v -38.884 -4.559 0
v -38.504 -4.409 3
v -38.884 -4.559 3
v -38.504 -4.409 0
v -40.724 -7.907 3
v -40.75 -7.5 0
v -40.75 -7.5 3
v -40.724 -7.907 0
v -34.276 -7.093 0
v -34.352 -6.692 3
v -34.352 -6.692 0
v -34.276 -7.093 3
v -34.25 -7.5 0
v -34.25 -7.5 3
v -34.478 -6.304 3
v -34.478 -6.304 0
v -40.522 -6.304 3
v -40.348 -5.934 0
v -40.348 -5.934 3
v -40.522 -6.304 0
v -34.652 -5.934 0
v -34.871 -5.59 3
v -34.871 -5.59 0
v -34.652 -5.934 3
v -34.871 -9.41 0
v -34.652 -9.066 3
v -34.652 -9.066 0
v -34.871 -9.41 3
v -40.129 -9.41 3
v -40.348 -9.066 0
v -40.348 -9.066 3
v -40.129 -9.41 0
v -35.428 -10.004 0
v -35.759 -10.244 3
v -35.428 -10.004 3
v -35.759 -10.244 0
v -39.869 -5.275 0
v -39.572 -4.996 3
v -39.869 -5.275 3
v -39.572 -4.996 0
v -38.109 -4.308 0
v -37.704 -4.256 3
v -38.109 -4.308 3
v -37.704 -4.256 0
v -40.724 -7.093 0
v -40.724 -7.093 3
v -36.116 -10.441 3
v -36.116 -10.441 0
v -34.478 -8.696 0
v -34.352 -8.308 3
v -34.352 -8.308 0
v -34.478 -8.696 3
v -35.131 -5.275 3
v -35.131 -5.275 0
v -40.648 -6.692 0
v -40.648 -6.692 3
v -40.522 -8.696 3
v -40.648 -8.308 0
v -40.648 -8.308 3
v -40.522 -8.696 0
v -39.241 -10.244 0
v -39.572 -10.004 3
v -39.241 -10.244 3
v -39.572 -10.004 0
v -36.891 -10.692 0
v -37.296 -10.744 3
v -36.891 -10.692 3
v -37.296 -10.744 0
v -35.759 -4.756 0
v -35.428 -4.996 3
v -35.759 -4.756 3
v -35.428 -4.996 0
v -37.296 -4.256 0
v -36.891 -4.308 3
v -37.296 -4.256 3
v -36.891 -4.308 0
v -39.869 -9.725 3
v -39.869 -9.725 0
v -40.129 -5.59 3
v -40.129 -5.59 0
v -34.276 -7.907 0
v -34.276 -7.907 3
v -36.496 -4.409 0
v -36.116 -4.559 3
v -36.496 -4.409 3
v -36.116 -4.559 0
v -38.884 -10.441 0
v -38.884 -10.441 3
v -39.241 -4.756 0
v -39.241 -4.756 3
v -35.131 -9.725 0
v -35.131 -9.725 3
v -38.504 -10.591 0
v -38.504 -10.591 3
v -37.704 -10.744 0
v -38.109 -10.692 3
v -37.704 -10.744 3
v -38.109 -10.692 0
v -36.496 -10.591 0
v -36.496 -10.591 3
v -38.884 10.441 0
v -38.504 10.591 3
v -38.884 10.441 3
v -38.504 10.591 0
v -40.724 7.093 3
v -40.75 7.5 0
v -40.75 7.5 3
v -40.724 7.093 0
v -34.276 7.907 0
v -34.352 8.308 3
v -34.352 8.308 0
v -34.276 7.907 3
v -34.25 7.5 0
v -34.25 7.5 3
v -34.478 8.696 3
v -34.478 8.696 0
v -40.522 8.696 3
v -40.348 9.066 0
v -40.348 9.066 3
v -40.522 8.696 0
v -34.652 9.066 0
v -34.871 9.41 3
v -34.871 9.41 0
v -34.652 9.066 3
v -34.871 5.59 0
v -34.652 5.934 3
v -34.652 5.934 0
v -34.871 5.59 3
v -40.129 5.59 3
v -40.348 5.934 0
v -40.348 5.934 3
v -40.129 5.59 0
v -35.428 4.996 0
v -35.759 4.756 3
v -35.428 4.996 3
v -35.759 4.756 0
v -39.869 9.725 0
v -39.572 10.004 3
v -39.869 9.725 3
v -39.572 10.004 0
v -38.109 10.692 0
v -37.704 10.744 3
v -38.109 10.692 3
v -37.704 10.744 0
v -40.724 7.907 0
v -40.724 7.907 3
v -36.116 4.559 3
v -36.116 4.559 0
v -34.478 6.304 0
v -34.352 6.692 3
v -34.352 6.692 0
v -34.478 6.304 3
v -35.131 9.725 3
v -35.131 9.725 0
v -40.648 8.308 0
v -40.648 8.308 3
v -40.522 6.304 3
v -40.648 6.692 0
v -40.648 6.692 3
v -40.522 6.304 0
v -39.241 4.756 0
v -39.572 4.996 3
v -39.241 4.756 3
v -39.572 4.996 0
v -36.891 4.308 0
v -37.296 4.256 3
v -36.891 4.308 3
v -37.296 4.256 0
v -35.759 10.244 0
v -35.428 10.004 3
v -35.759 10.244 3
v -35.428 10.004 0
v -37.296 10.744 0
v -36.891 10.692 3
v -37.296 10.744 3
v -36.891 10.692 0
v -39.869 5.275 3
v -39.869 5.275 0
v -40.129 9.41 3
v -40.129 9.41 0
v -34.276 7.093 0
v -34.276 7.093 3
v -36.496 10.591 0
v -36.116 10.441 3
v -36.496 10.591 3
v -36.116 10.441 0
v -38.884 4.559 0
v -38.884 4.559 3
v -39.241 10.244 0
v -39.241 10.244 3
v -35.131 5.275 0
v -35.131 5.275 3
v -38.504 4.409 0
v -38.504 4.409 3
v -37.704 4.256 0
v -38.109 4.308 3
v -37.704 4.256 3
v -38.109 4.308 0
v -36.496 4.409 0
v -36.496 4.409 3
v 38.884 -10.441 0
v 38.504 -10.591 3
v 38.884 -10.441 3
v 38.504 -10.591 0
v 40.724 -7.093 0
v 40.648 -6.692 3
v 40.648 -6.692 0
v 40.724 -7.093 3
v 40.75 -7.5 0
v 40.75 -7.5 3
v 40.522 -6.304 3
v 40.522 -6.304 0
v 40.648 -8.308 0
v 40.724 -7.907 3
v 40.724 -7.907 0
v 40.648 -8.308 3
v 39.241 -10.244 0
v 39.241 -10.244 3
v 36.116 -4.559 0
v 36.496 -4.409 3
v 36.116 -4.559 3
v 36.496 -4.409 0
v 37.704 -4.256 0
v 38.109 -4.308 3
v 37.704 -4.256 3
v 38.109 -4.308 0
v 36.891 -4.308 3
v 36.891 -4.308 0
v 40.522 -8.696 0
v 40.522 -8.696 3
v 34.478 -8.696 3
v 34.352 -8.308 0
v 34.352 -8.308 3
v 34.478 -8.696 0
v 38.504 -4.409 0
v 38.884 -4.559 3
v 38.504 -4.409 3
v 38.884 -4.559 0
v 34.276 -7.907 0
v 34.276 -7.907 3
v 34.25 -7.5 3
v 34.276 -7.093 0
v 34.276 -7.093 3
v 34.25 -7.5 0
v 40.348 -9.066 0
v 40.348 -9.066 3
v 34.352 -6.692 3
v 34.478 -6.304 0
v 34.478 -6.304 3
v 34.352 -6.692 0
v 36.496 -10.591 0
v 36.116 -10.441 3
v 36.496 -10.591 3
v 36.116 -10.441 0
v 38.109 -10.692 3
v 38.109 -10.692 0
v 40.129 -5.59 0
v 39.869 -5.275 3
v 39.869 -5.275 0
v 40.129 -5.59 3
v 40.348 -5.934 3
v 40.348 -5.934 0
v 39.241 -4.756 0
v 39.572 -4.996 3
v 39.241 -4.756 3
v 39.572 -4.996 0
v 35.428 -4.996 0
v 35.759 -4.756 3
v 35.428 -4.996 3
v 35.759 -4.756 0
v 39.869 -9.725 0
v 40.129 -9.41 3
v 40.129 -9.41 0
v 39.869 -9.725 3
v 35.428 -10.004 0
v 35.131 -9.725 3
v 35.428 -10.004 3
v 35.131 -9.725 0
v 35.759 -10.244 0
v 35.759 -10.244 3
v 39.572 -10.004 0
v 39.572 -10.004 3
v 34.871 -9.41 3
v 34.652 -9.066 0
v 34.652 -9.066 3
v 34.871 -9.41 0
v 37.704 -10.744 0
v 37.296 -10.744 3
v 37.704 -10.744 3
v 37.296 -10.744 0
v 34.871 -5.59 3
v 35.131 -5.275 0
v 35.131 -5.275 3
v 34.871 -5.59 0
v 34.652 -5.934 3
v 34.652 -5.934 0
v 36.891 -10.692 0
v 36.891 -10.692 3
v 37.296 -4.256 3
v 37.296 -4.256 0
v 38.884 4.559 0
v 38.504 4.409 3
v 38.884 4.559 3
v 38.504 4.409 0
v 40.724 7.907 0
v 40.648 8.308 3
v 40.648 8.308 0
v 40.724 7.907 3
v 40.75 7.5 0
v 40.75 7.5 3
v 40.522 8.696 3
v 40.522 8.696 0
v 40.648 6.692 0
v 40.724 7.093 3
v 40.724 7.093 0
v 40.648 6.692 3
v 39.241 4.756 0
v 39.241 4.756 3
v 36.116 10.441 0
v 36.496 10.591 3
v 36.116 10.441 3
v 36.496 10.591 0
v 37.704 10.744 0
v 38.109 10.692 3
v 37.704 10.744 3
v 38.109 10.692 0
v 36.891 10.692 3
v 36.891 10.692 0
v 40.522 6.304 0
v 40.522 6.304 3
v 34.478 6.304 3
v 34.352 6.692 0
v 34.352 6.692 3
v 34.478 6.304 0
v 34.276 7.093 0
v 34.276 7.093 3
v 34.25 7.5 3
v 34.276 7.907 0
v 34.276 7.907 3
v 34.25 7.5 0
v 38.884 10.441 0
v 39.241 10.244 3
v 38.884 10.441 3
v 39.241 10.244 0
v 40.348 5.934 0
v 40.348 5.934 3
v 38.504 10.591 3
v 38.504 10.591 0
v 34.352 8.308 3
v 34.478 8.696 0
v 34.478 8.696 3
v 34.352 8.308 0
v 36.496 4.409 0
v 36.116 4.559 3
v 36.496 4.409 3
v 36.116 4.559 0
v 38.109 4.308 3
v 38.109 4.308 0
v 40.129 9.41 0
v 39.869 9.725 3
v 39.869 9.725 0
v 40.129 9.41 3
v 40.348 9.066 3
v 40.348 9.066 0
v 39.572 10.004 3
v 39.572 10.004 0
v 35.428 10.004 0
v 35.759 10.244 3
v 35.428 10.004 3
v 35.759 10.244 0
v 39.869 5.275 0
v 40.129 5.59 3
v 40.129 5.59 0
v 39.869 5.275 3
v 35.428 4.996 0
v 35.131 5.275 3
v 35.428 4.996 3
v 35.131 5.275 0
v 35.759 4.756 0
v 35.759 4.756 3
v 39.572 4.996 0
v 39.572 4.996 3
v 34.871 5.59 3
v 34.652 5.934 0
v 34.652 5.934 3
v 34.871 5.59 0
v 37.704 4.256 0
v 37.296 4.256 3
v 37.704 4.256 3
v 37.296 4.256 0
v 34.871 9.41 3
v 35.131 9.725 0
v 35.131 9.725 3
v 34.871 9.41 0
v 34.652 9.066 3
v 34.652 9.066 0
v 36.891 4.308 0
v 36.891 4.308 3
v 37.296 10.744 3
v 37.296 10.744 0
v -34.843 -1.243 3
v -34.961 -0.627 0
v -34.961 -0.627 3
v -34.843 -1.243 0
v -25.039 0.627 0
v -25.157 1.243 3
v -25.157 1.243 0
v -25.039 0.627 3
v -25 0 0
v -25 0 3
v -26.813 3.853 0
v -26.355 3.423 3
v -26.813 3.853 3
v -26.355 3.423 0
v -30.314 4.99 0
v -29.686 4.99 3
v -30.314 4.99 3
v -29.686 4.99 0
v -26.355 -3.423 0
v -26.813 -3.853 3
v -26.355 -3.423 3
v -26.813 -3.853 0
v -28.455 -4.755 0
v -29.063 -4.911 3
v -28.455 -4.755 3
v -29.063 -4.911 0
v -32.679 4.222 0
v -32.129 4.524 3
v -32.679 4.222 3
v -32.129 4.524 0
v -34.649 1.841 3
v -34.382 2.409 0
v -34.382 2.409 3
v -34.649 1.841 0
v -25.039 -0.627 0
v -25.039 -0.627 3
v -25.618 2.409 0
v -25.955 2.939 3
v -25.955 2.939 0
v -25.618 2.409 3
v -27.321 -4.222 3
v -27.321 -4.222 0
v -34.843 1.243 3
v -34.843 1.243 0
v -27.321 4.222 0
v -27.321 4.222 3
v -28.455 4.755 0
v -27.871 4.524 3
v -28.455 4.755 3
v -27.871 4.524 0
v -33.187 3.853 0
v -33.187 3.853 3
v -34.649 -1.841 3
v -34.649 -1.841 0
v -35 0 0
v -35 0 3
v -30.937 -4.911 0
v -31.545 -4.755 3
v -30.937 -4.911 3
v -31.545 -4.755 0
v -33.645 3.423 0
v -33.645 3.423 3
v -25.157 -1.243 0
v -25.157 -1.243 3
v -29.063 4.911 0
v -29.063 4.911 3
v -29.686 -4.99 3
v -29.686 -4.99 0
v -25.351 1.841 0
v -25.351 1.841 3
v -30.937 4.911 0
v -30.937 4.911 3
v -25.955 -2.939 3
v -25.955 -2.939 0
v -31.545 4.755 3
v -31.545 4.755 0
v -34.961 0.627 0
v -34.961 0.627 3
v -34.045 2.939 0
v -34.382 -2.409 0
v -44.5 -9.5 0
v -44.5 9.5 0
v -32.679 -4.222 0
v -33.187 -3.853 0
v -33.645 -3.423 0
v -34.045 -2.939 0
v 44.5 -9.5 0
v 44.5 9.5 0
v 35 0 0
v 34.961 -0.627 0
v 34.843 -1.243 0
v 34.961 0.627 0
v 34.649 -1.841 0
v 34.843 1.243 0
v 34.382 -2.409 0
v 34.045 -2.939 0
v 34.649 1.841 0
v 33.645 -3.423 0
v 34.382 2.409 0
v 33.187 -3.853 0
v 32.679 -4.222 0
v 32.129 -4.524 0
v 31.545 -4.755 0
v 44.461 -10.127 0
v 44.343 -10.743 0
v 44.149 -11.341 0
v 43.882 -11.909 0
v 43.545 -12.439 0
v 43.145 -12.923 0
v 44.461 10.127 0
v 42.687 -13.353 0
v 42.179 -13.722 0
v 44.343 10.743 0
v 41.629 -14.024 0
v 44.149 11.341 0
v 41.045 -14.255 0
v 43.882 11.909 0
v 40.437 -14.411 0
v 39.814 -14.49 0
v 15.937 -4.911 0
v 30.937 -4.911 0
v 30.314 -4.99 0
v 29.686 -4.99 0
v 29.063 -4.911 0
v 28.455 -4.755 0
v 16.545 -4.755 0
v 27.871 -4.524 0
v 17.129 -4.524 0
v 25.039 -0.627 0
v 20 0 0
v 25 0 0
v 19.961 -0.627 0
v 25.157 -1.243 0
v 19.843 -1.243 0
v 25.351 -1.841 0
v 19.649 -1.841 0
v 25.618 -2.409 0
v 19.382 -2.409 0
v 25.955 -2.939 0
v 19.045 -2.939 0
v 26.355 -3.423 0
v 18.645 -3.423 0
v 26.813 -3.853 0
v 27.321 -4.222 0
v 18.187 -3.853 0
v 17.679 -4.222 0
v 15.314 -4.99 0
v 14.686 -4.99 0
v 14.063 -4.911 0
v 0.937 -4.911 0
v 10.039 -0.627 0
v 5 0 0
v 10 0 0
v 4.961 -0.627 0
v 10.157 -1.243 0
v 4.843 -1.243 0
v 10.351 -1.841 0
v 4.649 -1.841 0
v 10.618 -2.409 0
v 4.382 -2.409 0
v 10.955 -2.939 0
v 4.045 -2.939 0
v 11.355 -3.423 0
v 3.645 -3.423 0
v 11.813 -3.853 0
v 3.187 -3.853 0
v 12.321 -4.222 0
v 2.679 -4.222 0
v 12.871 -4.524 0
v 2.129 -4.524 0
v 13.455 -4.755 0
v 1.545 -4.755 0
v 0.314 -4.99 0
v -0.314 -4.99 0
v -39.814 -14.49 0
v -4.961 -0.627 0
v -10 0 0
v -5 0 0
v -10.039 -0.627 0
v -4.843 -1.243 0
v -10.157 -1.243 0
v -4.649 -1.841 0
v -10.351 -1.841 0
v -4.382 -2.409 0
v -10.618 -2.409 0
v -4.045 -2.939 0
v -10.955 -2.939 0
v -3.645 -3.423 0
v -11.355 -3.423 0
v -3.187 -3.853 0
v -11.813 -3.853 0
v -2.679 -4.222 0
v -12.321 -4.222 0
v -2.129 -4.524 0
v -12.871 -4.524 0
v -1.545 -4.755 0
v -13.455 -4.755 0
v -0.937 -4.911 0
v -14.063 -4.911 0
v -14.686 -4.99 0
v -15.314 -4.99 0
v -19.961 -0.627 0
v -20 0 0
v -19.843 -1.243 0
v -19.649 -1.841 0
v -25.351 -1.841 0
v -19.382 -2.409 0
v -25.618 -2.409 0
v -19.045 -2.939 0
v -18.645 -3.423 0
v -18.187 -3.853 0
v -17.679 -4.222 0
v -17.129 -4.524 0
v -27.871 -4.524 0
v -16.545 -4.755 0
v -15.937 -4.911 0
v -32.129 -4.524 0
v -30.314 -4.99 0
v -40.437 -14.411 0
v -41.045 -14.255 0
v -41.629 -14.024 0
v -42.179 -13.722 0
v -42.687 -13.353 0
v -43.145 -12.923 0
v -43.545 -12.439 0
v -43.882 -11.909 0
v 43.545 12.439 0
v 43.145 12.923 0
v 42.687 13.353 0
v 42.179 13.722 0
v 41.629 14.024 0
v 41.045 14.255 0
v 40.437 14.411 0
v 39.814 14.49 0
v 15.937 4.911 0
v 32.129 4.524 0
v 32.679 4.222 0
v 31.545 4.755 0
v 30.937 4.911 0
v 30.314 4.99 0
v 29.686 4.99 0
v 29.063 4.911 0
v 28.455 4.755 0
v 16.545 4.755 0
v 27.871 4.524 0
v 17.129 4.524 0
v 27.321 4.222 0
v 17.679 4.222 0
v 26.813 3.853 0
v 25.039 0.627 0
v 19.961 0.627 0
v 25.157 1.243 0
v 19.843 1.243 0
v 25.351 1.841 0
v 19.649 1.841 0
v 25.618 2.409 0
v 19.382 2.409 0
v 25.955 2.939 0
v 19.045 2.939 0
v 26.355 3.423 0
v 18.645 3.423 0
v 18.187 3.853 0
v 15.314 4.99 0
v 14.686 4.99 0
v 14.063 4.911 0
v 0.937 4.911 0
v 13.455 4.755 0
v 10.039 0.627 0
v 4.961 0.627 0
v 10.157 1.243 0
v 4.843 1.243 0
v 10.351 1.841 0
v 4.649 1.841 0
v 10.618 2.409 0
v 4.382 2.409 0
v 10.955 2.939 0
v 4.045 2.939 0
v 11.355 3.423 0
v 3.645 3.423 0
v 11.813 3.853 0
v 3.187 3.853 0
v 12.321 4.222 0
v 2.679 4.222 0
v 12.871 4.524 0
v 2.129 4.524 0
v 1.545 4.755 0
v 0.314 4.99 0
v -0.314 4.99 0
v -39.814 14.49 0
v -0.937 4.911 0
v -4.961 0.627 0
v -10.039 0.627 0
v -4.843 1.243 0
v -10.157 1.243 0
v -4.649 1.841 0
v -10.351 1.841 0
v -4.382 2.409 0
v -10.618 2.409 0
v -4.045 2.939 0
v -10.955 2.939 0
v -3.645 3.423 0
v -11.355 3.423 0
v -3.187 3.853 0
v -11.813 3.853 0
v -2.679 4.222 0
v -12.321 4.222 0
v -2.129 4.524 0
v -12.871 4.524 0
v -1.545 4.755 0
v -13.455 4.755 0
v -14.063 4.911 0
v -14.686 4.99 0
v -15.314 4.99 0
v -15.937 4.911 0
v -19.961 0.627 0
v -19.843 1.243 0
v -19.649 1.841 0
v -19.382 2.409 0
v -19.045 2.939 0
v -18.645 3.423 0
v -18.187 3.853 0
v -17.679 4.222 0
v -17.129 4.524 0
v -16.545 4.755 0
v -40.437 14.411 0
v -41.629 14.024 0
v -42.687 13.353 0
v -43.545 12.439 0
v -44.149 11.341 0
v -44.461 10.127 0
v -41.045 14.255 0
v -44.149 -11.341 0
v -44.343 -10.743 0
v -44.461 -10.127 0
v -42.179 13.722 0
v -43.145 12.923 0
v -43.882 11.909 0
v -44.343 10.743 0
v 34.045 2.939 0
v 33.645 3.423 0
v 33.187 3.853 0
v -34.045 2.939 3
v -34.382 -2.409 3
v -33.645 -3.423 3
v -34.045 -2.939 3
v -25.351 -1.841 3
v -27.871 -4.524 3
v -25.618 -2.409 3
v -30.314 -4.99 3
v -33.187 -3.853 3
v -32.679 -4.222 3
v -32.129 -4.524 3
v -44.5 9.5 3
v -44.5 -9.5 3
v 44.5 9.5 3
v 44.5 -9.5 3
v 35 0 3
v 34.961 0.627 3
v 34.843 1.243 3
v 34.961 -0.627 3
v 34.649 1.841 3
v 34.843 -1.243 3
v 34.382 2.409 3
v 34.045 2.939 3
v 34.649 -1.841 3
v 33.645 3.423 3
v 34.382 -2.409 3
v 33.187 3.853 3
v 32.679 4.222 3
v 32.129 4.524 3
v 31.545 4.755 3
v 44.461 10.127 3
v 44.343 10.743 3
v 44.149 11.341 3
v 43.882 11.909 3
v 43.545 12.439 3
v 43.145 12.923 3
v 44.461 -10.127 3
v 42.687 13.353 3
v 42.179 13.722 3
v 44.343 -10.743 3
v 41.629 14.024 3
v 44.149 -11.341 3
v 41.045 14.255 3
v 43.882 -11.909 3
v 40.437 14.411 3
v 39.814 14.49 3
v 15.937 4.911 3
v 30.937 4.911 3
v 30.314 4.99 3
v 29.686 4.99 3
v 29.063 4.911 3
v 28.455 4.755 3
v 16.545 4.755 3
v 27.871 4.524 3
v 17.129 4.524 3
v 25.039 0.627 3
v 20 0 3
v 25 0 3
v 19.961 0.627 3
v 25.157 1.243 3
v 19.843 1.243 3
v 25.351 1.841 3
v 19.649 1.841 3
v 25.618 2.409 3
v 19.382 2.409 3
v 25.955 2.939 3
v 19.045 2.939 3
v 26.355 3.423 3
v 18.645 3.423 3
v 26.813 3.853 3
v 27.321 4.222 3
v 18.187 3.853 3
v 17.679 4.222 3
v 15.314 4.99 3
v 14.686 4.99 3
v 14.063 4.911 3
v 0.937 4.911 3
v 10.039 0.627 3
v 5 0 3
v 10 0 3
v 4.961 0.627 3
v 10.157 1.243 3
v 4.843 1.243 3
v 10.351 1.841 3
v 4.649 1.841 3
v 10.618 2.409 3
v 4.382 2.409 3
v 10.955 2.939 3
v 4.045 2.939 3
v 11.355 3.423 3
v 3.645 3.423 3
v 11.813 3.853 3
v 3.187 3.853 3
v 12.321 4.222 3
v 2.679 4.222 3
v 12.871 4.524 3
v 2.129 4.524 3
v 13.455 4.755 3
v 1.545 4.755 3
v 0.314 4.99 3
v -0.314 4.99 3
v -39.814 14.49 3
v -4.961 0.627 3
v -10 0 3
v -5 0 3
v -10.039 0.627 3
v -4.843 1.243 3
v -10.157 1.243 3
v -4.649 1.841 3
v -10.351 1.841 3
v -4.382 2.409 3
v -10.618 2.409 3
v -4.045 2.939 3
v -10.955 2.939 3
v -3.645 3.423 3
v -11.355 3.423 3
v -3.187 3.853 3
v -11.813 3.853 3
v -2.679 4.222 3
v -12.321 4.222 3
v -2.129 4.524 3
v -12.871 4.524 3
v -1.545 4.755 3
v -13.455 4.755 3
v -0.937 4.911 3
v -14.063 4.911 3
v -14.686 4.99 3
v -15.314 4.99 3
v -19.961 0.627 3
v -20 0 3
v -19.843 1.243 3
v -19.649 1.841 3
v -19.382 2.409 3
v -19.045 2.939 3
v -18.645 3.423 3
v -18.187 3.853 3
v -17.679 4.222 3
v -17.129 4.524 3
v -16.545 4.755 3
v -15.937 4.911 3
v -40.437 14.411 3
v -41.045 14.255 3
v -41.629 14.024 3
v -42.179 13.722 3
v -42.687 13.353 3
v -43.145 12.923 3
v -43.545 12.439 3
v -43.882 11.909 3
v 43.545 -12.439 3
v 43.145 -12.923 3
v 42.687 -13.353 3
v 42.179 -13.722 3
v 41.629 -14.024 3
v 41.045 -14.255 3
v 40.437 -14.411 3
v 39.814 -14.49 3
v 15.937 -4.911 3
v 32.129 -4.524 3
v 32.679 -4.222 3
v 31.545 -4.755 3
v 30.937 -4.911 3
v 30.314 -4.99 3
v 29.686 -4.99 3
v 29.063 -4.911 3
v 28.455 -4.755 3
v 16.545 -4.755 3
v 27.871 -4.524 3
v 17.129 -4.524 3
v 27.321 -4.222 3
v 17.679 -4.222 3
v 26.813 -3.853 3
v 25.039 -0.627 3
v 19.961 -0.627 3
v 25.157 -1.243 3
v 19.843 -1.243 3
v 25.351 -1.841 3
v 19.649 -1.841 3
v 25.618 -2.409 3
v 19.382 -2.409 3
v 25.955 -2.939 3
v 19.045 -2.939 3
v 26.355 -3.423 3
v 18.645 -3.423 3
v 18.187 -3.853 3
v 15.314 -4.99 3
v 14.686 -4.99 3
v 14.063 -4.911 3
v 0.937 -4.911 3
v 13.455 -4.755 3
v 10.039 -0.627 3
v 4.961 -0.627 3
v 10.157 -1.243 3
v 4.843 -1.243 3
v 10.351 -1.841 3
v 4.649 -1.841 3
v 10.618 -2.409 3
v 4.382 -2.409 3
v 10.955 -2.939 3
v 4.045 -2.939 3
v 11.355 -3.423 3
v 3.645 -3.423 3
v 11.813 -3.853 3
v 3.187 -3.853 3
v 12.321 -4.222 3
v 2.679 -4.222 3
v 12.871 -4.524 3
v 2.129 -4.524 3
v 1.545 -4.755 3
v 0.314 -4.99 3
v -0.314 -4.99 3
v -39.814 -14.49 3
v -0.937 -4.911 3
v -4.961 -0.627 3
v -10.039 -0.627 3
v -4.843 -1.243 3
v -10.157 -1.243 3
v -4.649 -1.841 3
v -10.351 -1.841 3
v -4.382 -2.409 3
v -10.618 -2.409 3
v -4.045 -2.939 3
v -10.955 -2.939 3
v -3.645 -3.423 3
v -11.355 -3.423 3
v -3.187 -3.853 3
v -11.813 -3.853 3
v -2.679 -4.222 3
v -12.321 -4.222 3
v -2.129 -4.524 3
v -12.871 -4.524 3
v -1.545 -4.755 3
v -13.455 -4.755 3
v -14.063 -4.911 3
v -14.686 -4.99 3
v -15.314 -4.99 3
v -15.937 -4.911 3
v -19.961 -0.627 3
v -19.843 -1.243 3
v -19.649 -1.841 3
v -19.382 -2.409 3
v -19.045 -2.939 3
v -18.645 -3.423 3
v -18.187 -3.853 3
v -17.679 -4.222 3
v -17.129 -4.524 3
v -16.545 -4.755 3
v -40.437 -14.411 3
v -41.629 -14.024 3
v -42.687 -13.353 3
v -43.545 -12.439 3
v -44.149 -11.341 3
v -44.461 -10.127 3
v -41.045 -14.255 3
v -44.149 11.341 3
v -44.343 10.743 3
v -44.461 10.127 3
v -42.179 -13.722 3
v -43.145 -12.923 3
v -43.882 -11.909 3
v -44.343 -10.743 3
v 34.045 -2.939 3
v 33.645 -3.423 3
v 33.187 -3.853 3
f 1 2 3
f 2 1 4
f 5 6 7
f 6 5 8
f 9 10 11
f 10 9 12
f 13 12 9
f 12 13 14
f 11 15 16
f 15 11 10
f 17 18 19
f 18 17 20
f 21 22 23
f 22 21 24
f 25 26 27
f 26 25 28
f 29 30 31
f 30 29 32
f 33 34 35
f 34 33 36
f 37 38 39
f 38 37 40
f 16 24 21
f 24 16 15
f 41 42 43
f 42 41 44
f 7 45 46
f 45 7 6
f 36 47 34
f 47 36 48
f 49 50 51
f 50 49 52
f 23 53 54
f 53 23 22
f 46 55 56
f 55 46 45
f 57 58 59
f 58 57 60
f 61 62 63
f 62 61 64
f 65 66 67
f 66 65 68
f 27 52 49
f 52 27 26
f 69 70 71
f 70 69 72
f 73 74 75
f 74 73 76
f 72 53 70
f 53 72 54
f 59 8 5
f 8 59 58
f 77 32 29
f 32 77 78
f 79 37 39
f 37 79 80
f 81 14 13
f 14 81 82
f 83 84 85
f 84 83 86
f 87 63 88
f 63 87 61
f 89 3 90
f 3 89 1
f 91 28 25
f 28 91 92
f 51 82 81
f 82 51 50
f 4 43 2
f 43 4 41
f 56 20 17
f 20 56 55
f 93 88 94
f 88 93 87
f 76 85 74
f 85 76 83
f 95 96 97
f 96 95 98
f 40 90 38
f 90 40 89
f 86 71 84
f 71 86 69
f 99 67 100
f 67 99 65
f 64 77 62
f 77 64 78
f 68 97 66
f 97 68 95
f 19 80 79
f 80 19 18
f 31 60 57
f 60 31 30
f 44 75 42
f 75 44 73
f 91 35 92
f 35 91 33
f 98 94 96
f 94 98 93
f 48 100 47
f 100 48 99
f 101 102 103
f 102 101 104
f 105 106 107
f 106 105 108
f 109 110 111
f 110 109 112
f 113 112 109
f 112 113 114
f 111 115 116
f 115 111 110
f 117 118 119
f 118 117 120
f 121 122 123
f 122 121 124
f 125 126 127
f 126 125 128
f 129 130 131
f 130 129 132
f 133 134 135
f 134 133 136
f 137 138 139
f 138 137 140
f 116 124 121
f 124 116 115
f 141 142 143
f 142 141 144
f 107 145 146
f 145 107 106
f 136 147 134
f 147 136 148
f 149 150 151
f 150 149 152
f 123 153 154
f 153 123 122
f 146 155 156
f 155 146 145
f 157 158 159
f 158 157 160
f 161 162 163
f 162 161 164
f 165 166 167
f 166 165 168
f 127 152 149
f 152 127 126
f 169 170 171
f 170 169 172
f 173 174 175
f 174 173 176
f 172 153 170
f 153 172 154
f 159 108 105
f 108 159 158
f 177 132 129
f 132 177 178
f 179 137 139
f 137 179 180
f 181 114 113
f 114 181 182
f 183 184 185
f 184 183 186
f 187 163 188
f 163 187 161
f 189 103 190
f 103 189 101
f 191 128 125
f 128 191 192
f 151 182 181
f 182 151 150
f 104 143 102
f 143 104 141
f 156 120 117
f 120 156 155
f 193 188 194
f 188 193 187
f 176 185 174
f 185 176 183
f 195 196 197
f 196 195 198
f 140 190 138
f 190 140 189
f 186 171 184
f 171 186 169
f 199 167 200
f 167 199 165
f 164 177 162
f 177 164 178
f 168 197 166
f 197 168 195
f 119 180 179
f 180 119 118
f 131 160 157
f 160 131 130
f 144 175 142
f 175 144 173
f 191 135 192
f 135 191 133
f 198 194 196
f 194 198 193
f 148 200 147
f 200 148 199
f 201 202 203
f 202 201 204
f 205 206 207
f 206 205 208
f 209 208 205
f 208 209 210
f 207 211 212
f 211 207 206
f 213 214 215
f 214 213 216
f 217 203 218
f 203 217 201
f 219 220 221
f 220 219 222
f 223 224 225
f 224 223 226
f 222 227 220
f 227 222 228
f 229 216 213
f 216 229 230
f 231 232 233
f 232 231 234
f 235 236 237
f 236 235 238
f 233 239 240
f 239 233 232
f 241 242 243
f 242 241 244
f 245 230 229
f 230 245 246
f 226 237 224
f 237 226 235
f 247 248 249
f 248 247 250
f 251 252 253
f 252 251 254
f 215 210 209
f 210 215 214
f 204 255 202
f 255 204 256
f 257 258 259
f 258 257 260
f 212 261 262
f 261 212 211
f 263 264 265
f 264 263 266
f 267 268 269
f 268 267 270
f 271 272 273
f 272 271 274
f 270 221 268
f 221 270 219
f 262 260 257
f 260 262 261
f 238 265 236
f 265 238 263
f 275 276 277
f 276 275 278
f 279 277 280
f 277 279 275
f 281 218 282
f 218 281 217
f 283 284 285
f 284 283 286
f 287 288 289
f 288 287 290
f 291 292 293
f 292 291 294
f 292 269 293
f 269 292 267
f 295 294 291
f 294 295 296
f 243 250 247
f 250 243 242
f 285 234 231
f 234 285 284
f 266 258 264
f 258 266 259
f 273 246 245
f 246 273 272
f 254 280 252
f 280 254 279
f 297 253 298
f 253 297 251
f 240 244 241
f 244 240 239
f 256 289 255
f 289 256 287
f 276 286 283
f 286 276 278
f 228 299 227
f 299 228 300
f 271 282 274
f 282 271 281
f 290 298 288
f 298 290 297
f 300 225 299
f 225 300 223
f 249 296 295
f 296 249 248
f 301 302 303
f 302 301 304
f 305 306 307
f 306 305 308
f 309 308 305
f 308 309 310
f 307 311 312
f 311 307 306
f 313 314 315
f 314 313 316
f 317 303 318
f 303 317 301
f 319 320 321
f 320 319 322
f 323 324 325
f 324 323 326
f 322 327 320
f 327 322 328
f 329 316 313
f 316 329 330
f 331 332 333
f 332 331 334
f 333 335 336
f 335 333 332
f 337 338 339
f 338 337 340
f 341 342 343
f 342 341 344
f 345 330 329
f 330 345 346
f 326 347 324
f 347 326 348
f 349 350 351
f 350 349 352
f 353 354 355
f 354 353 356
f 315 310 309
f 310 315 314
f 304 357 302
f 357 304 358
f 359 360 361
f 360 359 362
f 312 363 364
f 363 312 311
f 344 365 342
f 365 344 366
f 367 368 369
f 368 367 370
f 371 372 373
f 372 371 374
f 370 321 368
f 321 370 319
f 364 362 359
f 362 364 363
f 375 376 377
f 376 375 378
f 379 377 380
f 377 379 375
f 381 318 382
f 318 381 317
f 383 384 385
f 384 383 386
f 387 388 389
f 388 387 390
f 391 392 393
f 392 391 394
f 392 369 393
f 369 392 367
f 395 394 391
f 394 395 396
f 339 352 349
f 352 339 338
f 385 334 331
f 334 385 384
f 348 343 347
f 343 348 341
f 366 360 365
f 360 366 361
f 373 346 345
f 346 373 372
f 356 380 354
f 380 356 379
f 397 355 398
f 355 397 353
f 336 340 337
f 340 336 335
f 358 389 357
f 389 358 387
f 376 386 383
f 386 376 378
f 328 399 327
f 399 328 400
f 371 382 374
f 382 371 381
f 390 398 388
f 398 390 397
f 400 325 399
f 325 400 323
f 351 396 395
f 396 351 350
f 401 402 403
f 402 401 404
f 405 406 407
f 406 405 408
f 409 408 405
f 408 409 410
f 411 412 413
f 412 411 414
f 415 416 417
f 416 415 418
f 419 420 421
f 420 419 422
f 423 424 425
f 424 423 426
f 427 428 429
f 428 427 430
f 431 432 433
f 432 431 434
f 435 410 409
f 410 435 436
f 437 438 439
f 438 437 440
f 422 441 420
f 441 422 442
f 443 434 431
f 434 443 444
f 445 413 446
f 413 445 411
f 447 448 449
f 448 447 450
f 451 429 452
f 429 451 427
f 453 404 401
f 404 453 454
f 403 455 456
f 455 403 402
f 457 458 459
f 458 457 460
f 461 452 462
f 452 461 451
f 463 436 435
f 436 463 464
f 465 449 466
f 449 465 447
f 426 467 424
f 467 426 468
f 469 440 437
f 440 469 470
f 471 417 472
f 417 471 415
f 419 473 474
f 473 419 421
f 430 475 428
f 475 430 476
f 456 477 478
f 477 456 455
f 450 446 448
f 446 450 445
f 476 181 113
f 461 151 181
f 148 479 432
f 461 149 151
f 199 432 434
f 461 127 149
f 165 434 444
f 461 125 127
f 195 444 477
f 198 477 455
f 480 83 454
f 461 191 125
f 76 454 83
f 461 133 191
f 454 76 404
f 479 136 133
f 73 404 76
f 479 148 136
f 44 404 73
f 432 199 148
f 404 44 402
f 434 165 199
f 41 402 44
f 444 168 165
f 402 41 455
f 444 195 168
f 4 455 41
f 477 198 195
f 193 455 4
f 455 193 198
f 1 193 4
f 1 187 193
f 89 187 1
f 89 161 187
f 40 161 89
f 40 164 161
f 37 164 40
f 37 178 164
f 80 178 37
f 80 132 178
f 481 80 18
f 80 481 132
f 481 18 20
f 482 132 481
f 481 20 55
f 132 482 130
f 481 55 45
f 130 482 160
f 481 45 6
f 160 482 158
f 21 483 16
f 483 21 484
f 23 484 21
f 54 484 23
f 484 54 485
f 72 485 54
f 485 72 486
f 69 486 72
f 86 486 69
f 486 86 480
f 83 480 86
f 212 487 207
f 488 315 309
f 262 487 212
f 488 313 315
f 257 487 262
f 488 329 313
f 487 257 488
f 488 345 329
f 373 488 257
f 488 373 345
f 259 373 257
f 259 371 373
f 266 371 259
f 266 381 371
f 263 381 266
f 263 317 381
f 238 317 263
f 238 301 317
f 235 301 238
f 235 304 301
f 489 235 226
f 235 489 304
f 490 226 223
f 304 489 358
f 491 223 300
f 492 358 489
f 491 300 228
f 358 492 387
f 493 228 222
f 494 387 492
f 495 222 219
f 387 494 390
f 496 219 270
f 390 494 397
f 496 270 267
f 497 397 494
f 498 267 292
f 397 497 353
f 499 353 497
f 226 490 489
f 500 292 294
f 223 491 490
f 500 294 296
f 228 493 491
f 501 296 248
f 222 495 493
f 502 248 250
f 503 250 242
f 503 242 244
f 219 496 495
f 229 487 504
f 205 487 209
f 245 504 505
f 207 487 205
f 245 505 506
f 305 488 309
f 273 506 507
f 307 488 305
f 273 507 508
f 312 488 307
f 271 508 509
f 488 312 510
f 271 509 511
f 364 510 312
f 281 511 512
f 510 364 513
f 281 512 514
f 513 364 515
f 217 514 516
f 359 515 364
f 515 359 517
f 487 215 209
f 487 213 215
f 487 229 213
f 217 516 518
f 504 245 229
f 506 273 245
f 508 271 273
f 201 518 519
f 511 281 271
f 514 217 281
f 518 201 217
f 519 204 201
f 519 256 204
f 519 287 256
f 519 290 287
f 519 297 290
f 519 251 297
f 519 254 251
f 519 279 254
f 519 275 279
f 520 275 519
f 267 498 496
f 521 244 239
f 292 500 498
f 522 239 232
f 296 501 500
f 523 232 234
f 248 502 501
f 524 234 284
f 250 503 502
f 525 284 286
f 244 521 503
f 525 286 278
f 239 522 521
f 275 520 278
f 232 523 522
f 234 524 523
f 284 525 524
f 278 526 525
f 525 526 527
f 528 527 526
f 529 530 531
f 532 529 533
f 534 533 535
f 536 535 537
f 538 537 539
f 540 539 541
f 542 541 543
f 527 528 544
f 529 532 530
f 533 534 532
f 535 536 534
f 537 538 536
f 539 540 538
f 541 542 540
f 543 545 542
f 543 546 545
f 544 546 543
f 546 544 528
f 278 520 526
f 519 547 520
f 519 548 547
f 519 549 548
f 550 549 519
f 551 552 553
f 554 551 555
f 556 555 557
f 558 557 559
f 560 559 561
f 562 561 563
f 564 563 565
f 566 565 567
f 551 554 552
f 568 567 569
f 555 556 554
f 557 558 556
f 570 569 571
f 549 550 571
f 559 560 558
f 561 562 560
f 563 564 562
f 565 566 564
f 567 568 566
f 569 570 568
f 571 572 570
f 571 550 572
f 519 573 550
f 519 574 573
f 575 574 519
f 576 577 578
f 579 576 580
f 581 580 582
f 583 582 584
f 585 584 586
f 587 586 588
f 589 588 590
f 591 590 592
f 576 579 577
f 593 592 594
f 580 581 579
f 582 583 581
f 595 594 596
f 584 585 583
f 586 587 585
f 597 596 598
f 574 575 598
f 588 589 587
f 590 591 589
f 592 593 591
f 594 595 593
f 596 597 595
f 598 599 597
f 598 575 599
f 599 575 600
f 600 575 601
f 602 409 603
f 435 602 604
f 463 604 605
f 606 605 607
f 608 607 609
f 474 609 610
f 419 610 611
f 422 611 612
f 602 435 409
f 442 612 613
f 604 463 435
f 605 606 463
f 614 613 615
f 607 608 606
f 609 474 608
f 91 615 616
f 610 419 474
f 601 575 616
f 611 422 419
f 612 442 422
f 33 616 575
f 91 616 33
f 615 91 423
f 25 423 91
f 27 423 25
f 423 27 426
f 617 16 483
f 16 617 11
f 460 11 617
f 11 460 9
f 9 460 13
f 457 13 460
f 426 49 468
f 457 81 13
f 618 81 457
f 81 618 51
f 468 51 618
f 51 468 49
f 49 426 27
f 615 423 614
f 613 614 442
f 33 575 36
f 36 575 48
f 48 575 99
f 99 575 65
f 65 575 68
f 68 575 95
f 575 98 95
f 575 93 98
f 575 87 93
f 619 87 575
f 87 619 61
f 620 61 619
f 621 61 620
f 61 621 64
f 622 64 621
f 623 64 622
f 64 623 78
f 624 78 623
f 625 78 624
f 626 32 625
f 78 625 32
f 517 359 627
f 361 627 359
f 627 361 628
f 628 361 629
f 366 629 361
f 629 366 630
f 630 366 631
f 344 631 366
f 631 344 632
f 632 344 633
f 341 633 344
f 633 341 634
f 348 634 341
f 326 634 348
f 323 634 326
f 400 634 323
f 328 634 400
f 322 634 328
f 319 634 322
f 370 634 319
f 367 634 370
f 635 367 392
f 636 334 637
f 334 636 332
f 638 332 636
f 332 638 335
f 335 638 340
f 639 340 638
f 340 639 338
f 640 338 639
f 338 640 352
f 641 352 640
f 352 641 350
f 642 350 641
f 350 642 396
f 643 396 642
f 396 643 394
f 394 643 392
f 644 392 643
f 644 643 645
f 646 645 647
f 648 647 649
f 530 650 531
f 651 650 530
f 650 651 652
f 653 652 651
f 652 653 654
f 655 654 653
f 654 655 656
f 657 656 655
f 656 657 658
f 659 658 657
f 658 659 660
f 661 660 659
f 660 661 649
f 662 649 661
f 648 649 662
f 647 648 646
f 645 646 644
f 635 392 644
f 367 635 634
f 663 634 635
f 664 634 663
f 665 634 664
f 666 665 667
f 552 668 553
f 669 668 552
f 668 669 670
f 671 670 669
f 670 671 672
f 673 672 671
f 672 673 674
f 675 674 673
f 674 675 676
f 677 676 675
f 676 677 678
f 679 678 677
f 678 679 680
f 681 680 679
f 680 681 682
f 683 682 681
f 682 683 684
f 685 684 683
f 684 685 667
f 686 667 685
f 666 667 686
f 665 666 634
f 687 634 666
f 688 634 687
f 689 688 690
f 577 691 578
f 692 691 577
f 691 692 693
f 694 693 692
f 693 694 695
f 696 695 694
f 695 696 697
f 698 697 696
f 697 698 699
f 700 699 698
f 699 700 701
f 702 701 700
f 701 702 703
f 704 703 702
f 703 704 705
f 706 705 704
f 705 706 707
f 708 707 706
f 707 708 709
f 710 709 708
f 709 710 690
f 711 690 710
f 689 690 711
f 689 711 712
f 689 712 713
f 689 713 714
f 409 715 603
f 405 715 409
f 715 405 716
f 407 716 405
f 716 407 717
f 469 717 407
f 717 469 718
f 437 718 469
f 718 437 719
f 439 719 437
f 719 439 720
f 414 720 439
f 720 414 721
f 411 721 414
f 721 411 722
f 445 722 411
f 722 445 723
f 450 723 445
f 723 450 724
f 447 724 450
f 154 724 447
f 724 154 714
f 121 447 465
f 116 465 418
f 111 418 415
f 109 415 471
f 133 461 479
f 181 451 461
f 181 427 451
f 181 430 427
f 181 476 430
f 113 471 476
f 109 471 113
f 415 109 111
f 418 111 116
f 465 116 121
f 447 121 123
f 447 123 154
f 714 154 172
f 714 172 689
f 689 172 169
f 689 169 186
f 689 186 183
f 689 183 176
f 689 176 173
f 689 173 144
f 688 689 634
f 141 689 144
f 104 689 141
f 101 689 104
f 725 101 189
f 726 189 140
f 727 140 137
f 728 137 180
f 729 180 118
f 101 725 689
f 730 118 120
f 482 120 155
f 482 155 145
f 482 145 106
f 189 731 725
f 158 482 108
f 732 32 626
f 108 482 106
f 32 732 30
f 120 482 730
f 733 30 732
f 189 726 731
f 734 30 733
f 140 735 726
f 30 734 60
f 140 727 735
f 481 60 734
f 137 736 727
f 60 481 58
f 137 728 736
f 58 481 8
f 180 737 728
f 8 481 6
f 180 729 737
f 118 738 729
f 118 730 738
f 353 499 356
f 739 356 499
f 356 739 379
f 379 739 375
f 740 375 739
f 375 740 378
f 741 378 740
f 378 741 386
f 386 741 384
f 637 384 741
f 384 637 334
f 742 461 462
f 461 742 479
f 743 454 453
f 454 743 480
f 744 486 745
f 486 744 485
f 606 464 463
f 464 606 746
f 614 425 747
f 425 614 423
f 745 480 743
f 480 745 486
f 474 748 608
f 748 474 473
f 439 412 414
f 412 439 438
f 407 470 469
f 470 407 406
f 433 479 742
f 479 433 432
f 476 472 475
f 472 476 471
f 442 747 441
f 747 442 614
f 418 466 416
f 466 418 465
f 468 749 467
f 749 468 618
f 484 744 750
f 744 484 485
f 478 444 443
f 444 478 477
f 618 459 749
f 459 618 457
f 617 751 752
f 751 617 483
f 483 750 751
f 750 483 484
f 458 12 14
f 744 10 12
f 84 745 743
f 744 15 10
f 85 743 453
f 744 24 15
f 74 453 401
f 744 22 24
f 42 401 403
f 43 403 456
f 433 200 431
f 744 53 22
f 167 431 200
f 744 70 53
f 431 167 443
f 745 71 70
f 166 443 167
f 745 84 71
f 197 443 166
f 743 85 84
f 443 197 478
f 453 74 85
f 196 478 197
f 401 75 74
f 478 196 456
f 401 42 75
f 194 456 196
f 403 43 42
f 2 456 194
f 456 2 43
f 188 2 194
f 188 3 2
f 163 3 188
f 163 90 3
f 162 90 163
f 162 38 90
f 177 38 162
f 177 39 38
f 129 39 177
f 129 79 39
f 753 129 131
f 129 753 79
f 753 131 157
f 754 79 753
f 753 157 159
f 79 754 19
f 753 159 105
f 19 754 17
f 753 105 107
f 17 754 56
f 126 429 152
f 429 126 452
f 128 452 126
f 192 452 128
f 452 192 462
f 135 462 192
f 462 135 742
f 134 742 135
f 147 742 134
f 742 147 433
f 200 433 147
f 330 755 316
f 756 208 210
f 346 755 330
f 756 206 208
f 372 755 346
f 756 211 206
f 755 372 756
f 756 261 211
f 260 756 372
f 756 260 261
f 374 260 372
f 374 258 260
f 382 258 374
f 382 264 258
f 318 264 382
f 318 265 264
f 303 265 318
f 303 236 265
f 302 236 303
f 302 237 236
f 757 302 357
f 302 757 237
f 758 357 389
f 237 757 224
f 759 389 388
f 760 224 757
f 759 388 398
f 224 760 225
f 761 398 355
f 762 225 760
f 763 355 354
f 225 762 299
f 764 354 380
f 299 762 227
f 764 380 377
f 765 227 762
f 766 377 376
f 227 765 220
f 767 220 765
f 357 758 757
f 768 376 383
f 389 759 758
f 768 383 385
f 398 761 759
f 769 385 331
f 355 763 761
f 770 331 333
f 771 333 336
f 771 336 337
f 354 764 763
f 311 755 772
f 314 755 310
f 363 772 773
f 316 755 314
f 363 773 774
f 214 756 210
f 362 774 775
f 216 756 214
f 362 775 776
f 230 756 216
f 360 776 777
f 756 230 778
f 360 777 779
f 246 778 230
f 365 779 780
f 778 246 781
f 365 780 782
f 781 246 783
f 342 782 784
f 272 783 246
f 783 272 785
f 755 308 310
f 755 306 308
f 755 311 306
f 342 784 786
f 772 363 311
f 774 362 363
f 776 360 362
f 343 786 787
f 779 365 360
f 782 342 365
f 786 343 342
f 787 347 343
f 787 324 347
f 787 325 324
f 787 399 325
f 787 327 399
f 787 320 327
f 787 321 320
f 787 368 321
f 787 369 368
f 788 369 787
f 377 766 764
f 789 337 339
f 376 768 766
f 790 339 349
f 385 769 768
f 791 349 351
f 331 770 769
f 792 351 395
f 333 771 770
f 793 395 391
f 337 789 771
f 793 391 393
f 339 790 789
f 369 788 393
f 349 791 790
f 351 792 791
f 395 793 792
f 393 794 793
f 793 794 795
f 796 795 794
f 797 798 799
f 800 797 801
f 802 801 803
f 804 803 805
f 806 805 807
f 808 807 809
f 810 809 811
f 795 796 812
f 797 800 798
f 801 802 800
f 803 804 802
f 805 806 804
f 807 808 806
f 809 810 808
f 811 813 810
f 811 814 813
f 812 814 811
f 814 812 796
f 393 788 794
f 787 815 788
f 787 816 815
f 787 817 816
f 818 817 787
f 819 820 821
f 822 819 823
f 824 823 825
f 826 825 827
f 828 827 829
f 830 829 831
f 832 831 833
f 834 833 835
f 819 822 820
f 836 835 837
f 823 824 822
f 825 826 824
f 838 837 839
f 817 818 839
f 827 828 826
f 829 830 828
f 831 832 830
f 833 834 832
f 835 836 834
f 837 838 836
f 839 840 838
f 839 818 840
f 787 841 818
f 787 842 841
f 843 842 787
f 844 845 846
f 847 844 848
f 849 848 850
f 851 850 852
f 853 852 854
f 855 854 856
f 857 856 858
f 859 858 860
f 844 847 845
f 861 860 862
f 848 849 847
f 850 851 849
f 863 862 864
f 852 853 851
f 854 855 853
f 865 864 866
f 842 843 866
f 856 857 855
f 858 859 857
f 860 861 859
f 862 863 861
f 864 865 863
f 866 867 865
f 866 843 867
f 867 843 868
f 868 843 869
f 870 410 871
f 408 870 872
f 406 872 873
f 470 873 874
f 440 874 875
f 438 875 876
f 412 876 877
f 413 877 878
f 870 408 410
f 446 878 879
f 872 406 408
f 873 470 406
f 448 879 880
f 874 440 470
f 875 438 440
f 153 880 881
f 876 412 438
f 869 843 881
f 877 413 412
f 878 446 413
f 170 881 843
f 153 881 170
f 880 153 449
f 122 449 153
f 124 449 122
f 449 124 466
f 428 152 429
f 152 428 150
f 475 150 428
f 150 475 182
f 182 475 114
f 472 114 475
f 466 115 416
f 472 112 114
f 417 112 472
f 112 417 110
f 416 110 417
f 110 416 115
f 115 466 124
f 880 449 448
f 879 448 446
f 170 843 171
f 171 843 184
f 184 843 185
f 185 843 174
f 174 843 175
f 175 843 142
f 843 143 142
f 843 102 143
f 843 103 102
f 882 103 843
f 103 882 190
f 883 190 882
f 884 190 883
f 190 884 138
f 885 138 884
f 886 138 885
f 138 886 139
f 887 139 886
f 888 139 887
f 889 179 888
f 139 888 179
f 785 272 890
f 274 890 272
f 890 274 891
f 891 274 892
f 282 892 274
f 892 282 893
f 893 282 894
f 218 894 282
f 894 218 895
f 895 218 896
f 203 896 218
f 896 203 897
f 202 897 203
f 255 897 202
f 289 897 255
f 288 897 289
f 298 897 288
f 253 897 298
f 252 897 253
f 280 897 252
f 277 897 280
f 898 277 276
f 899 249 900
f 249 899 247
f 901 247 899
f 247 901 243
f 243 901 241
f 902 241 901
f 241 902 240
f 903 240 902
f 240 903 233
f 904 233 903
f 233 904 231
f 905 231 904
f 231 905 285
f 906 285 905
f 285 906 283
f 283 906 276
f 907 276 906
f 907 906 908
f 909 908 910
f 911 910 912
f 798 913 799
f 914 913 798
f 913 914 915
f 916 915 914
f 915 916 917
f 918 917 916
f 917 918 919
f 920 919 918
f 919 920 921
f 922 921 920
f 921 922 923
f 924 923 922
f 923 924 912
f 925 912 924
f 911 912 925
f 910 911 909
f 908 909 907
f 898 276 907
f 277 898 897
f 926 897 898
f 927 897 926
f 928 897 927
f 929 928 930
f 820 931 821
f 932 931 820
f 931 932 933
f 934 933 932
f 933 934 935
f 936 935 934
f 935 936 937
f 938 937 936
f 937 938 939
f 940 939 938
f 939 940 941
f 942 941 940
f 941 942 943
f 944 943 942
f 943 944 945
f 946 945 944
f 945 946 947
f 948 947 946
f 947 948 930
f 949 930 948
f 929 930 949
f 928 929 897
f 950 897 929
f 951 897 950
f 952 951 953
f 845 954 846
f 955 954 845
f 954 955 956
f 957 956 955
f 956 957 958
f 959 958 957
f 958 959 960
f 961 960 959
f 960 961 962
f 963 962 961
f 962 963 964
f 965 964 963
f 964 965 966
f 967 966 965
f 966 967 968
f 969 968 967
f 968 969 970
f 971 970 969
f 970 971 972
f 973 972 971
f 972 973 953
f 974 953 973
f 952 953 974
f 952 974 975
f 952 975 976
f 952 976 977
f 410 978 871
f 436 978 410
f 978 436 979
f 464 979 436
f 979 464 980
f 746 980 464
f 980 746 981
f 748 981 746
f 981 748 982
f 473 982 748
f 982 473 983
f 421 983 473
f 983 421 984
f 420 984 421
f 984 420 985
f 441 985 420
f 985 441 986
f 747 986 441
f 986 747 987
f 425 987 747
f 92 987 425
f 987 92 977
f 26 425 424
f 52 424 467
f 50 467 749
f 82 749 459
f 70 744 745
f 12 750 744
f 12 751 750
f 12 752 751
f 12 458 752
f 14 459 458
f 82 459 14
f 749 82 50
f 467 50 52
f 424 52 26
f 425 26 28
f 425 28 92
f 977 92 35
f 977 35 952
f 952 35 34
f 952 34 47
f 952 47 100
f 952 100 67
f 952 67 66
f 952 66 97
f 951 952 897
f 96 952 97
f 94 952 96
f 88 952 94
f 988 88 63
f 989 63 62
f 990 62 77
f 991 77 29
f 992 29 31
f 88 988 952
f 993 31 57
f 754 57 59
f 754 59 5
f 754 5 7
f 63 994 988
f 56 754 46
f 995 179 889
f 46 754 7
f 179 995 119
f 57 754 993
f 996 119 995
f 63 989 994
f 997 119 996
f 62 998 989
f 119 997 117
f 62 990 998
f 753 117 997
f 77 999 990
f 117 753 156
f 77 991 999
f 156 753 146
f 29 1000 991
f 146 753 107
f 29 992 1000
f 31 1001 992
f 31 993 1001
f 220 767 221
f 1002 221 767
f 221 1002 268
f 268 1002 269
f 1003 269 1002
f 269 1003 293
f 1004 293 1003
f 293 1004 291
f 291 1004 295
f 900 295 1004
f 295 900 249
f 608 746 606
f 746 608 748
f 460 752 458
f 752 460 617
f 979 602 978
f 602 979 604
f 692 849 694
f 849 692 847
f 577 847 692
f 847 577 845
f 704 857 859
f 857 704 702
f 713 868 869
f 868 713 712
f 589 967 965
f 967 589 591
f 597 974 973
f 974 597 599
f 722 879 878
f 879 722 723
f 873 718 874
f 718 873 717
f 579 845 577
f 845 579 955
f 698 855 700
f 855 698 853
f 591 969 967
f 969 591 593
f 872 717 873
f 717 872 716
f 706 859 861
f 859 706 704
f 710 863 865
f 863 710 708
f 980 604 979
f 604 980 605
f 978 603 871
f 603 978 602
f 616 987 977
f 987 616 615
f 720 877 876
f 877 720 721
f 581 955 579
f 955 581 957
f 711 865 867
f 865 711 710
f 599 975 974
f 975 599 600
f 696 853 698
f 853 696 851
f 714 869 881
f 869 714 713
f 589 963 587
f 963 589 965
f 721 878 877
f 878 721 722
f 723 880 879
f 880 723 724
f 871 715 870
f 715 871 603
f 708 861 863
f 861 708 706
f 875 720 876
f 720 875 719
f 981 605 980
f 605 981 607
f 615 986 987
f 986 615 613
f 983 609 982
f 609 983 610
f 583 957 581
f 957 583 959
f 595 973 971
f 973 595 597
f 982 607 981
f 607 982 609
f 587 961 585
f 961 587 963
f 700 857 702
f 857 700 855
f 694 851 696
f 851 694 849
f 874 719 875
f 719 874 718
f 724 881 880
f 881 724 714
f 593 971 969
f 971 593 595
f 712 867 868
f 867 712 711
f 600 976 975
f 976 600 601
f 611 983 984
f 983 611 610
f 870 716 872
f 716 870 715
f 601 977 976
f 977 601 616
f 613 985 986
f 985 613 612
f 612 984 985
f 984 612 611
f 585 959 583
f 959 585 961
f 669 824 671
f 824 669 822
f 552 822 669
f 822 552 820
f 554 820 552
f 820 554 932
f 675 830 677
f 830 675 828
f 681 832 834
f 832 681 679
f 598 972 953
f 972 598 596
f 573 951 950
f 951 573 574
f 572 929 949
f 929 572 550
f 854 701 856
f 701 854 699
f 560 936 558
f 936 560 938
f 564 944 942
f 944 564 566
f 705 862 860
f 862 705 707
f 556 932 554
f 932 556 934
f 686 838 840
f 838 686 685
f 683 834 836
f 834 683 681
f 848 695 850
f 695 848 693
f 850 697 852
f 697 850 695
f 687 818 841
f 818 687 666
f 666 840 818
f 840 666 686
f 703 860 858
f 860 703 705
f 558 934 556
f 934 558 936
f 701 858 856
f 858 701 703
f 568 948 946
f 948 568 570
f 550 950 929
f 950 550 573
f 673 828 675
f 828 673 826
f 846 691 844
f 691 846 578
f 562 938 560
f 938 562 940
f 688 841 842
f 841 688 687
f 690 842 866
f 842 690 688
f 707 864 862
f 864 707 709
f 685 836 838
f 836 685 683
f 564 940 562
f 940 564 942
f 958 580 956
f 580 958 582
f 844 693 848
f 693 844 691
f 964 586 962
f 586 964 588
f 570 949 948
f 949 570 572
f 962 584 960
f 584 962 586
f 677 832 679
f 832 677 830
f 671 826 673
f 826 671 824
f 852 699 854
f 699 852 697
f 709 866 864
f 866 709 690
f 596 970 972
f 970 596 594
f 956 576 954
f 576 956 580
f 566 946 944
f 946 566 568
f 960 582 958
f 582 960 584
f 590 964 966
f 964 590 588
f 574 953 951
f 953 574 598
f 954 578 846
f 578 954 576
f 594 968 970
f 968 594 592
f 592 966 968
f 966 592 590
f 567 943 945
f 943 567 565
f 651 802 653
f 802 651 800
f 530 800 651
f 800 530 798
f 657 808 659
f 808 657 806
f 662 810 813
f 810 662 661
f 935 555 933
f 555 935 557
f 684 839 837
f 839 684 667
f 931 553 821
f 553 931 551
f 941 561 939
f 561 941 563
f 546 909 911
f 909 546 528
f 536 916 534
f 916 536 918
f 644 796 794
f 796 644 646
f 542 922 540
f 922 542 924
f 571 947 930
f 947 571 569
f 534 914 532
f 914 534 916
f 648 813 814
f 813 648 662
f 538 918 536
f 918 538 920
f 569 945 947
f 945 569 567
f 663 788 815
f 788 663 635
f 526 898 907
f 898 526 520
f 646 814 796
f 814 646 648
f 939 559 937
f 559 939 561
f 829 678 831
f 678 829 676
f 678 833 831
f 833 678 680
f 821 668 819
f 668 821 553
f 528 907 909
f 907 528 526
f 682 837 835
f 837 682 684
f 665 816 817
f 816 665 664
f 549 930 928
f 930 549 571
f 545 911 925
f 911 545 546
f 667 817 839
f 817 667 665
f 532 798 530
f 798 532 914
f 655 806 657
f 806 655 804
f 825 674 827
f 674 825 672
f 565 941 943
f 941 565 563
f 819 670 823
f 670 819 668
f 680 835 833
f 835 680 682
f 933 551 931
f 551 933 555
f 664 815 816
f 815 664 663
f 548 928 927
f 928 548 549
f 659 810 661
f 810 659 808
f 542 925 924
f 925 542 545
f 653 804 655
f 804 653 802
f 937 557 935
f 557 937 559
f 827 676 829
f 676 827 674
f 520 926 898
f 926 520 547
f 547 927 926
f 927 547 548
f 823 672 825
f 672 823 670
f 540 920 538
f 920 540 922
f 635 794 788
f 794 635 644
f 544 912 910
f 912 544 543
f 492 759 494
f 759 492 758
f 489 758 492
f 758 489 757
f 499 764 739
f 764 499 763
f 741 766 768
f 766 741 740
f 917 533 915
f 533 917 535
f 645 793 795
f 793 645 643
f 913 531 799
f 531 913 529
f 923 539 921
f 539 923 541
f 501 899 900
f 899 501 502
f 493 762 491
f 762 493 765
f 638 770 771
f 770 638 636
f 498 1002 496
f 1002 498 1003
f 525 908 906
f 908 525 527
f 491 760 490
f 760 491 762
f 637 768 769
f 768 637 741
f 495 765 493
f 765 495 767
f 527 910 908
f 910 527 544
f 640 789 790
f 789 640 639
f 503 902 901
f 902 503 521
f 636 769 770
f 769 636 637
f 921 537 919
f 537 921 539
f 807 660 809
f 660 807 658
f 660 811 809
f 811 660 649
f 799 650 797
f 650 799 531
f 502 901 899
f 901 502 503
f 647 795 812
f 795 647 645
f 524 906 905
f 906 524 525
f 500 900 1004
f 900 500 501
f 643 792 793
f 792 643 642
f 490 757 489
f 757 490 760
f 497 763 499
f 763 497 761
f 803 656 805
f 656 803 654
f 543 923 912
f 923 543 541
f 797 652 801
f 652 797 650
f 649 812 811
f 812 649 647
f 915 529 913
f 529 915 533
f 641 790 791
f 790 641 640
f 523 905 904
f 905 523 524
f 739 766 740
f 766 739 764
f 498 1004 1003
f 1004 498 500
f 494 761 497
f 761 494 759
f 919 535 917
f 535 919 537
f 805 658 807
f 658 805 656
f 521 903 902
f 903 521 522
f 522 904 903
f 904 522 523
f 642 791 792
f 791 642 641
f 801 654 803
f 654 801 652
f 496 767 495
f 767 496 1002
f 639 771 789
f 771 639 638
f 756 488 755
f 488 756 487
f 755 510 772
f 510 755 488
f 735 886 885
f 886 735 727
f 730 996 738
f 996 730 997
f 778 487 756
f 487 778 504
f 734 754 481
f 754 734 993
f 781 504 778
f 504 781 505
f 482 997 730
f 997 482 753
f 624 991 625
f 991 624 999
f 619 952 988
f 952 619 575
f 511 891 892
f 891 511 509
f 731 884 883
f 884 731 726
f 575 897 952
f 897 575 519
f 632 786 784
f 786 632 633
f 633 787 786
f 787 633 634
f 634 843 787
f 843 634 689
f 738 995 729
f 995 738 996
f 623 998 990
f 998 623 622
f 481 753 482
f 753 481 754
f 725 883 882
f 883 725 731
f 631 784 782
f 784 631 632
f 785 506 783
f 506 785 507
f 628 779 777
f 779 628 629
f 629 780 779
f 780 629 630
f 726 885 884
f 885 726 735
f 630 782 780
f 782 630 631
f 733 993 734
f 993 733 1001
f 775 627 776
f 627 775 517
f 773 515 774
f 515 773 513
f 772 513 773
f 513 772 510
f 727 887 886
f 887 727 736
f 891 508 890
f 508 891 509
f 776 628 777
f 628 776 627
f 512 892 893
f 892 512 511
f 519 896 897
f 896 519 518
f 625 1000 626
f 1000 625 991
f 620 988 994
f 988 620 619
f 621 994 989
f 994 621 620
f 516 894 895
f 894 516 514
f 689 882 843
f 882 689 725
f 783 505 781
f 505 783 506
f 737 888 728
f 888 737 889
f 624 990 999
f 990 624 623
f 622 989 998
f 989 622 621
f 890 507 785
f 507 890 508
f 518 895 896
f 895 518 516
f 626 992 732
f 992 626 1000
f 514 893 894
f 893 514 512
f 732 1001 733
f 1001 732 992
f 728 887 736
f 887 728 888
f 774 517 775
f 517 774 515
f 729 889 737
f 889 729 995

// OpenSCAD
$fn = 50;

difference() {
	union() {
		hull() {
			translate(v = [-39.5, 9.5, 0]) {
				cylinder(h = 3, r = 5);
			}
			translate(v = [39.5, 9.5, 0]) {
				cylinder(h = 3, r = 5);
			}
			translate(v = [-39.5, -9.5, 0]) {
				cylinder(h = 3, r = 5);
			}
			translate(v = [39.5, -9.5, 0]) {
				cylinder(h = 3, r = 5);
			}
		}
	}
	union() {
		translate(v = [-37.5, -7.5, -100.0]) {
			cylinder(h = 200, r = 3.25);
		}
		translate(v = [-37.5, 7.5, -100.0]) {
			cylinder(h = 200, r = 3.25);
		}
		translate(v = [37.5, -7.5, -100.0]) {
			cylinder(h = 200, r = 3.25);
		}
		translate(v = [37.5, 7.5, -100.0]) {
			cylinder(h = 200, r = 3.25);
		}
		translate(v = [-37.5, -7.5, -100.0]) {
			cylinder(h = 200, r = 1.8);
		}
		translate(v = [-37.5, 7.5, -100.0]) {
			cylinder(h = 200, r = 1.8);
		}
		translate(v = [37.5, -7.5, -100.0]) {
			cylinder(h = 200, r = 1.8);
		}
		translate(v = [37.5, 7.5, -100.0]) {
			cylinder(h = 200, r = 1.8);
		}
		translate(v = [-30.0, 0, 0.0]) {
			cylinder(h = 3, r = 5.0);
		}
		translate(v = [-15.0, 0, 0.0]) {
			cylinder(h = 3, r = 5.0);
		}
		cylinder(h = 3, r = 5.0);
		translate(v = [15.0, 0, 0.0]) {
			cylinder(h = 3, r = 5.0);
		}
		translate(v = [30.0, 0, 0.0]) {
			cylinder(h = 3, r = 5.0);
		}
	}
}
